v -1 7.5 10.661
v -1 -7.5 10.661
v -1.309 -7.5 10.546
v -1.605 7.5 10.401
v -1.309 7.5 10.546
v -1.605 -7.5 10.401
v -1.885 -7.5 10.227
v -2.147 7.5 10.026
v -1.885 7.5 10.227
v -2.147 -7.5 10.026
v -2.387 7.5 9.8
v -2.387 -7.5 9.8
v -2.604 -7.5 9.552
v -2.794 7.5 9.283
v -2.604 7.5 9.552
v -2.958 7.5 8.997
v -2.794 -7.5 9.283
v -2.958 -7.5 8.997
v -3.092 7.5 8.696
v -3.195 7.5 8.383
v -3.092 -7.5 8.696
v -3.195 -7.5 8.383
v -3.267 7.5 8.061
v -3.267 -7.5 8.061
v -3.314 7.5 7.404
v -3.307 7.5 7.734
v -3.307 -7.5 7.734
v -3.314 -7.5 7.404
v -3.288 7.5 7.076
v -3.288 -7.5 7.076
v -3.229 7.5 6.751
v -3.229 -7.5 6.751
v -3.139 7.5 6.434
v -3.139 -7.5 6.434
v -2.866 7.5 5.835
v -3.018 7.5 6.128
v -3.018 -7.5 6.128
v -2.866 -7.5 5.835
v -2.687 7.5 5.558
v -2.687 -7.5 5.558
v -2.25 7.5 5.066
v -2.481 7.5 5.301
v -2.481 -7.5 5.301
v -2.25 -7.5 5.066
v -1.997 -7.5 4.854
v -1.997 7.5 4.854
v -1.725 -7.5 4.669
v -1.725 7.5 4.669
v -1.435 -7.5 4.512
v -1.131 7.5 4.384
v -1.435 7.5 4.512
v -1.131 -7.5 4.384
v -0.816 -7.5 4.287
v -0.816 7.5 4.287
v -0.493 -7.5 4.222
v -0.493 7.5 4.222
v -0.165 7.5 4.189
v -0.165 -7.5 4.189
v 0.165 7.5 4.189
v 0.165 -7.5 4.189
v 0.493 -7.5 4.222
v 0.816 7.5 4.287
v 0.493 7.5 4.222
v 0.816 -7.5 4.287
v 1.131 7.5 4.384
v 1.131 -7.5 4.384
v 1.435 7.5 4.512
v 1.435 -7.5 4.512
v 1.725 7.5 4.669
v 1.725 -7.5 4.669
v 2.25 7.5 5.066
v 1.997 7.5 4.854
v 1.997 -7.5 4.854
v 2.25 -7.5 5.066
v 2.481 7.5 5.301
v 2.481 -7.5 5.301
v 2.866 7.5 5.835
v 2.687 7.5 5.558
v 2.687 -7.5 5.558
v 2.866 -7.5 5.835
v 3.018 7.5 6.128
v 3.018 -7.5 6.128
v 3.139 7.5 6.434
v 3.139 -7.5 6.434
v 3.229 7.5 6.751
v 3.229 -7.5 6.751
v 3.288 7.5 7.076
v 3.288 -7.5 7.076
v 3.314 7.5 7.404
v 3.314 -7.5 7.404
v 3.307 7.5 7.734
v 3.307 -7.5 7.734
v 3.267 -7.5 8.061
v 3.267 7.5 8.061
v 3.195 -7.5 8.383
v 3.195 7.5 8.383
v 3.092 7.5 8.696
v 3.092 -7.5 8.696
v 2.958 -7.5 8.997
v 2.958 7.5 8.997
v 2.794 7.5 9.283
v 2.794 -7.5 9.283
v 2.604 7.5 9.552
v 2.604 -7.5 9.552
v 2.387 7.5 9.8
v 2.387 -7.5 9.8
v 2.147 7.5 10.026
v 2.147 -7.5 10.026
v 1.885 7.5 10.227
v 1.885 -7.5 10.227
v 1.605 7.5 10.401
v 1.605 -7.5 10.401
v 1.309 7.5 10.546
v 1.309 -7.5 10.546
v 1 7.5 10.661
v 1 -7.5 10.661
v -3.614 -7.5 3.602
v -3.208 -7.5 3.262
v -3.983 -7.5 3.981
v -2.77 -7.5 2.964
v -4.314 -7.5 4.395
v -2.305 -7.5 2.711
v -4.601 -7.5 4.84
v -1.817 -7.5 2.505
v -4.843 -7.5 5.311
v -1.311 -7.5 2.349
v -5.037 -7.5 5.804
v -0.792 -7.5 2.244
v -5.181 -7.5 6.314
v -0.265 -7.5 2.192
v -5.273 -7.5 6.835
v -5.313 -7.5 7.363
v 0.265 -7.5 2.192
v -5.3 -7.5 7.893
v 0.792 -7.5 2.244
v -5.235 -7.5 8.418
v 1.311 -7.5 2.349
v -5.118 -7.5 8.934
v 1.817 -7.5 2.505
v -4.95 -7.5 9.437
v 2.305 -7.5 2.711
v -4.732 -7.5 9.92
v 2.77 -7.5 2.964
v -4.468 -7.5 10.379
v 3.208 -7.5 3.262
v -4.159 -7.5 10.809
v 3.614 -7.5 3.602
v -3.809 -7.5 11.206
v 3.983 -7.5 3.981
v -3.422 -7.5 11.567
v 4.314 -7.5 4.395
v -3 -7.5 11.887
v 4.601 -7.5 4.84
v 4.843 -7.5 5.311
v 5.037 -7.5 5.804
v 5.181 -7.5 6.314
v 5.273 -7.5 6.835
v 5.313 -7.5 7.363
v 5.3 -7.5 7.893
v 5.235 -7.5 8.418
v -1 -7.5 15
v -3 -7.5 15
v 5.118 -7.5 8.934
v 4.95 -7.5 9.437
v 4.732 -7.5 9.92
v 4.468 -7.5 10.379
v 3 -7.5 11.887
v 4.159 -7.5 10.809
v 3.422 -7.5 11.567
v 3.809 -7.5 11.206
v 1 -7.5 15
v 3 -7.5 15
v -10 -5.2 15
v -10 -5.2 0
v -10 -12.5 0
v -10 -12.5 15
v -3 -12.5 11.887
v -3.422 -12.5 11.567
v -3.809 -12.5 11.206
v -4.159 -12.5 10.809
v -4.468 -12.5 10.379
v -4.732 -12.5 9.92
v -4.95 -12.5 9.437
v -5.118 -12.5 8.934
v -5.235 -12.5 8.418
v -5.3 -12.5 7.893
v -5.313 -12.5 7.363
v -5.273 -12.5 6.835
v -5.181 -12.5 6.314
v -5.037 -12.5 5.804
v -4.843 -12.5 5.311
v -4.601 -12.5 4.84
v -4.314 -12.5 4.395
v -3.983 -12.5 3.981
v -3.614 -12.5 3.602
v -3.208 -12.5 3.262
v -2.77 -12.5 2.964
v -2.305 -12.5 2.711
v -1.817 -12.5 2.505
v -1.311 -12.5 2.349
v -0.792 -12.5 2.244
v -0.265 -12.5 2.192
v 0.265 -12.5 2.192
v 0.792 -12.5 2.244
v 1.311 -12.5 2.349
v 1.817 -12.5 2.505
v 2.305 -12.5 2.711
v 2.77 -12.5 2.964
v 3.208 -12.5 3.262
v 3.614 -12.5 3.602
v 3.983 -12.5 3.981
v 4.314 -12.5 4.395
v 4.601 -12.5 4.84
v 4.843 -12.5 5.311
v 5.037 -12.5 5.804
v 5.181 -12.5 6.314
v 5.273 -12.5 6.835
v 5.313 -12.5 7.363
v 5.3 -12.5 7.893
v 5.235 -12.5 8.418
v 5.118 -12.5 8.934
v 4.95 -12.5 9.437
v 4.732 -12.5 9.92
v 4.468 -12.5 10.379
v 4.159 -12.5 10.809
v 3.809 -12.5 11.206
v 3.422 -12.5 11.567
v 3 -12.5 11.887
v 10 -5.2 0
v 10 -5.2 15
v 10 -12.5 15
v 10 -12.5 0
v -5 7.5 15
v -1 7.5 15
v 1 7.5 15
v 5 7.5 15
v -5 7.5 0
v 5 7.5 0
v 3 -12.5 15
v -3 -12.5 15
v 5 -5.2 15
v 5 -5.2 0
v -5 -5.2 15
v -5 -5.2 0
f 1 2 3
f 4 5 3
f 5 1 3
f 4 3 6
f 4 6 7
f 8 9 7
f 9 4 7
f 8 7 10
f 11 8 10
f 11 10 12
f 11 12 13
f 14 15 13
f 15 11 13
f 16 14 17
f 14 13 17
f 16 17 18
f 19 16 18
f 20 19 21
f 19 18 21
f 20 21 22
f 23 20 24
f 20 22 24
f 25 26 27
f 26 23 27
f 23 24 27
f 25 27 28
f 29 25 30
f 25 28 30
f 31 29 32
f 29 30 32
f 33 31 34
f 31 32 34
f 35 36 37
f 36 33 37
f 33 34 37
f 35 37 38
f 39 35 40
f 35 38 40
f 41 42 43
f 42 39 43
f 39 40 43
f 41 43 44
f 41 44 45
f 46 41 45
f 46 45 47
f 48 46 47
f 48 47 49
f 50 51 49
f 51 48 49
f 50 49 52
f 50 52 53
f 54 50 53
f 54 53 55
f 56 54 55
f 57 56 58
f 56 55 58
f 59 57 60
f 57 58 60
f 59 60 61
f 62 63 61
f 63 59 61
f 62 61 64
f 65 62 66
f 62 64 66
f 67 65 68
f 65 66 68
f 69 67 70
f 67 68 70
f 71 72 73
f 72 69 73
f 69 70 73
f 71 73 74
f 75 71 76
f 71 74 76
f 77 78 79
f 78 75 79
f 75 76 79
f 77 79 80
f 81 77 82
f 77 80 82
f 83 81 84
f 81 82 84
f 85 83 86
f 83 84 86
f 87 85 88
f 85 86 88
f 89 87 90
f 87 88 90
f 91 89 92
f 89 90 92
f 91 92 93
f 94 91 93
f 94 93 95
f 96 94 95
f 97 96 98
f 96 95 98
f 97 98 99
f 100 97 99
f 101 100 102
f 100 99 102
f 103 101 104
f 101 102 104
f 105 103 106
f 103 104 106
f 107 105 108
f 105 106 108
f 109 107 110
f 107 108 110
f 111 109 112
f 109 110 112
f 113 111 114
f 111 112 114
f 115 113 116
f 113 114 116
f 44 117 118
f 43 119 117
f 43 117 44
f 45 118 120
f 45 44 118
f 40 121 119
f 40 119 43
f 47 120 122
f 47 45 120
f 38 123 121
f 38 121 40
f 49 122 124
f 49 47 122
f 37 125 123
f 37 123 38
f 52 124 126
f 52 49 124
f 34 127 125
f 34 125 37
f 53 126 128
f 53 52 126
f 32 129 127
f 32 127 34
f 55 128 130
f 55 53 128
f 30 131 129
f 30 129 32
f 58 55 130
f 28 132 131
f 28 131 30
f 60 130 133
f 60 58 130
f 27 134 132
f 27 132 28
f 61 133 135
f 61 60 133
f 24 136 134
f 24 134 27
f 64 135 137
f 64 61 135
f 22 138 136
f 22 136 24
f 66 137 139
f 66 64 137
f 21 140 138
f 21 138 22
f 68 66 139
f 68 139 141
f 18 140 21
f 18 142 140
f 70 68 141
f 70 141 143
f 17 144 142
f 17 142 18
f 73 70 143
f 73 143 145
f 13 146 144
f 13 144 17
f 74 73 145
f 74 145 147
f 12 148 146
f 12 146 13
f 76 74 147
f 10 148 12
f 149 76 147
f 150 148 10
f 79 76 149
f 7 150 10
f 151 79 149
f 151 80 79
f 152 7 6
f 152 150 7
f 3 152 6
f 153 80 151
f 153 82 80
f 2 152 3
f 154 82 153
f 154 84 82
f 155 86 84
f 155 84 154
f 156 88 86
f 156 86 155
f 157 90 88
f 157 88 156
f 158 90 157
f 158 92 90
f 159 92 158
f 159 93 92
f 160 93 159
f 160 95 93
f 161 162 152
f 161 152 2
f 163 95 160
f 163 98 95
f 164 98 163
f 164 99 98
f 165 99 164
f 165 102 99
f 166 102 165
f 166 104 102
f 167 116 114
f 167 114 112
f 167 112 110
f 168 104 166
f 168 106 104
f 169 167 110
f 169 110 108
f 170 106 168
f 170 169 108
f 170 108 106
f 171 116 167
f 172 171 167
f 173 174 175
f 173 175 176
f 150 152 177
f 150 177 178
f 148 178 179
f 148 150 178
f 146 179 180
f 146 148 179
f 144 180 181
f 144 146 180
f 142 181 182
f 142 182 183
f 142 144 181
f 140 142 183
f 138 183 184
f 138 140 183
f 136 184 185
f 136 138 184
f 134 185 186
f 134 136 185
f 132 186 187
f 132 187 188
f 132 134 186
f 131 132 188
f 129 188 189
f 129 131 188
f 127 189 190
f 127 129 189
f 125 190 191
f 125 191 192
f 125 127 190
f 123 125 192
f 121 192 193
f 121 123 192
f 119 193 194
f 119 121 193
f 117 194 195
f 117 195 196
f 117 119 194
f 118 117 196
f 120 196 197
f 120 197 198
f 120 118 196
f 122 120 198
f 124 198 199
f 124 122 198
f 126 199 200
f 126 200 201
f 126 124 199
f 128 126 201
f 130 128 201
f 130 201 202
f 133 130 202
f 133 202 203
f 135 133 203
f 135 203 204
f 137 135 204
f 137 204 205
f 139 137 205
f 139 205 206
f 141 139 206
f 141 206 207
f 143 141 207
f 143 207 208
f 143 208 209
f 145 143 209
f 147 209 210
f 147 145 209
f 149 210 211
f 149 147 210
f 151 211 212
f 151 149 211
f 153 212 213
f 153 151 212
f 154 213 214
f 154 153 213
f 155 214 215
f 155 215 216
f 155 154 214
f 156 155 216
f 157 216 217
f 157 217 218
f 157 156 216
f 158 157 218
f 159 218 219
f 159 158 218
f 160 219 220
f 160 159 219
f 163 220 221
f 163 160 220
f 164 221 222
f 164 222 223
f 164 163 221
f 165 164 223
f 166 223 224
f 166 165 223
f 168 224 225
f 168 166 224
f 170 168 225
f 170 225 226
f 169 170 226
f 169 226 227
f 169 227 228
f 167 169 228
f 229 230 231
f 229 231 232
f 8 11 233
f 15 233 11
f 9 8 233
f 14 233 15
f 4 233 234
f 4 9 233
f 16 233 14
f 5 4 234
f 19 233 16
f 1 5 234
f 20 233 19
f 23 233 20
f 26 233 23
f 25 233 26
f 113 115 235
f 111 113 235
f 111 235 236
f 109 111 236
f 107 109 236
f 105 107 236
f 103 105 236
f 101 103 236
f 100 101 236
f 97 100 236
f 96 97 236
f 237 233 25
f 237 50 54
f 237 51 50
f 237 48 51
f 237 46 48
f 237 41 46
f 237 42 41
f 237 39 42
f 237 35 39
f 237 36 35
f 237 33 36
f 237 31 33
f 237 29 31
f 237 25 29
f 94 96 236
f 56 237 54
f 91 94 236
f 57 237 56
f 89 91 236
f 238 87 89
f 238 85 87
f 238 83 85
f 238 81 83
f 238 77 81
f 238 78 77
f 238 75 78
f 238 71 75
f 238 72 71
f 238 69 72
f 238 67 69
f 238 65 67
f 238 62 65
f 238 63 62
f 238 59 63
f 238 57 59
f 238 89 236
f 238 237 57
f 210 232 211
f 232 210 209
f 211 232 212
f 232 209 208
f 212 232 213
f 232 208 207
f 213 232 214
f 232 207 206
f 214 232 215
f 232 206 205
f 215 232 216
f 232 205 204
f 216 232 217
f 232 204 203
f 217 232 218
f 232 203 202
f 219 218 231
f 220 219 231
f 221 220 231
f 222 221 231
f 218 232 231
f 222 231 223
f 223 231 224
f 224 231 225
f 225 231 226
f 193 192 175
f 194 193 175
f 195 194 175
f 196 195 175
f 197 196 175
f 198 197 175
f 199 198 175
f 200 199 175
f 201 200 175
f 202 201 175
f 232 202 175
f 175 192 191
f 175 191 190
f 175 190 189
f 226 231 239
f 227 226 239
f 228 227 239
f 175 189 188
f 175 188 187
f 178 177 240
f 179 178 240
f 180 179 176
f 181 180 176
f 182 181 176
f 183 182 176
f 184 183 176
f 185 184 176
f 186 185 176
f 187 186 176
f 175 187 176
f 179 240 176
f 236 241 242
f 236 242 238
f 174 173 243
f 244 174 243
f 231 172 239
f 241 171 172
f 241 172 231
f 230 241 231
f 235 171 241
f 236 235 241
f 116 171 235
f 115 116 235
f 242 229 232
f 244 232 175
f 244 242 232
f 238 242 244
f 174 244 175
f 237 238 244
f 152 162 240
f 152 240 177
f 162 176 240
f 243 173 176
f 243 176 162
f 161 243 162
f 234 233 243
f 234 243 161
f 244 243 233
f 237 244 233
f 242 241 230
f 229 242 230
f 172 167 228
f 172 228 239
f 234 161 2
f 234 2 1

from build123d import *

# Parameters (mm, degrees)
SKETCH1_W           = 10
SKETCH1_H           = 15
BOSS_EXTRUDE1_DEPTH = 15
SKETCH3_W           = 5
SKETCH3_H           = 2.3
BOSS_EXTRUDE2_DEPTH = 15
SKETCH4_R           = 3.315
CUT_EXTRUDE1_DEPTH  = 24.452078799
SKETCH6_W           = 2
SKETCH6_H           = 15
CUT_EXTRUDE2_DEPTH  = 8
BOSS_EXTRUDE3_DEPTH = 5


with BuildPart() as part:
    # Sketch1 → Boss-Extrude1 (new body)
    with BuildSketch(Plane.XY):
        Rectangle(SKETCH1_W, SKETCH1_H)
    extrude(amount=BOSS_EXTRUDE1_DEPTH)

    # Sketch3 → Boss-Extrude2 (add)
    with BuildSketch(Plane.XY.offset(15)):
        with Locations((-7.5, -6.35)):
            Rectangle(SKETCH3_W, SKETCH3_H)
        with Locations((7.5, -6.35)):
            Rectangle(SKETCH3_W, SKETCH3_H)
    extrude(amount=-BOSS_EXTRUDE2_DEPTH)

    # Sketch4 → Cut-Extrude1 (cut, through all)
    with BuildSketch(Plane.XZ.offset(7.5)):
        with Locations(Location((0, 7.5, 0), (0, 0, 270))):
            Circle(SKETCH4_R)
    extrude(amount=-CUT_EXTRUDE1_DEPTH, mode=Mode.SUBTRACT)

    # Sketch6 → Cut-Extrude2 (cut)
    with BuildSketch(Plane.XY.offset(15)):
        Rectangle(SKETCH6_W, SKETCH6_H)
    extrude(amount=-CUT_EXTRUDE2_DEPTH, mode=Mode.SUBTRACT)

    # Sketch7 → Boss-Extrude3 (add)
    with BuildSketch(Plane.XZ.offset(7.5)):
        with BuildLine():
            Line((3, 15), (10, 15))
            Line((10, 15), (10, 0))
            Line((10, 0), (-10, 0))
            Line((-10, 0), (-10, 15))
            Line((-10, 15), (-3, 15))
            Line((-3, 15), (-3, 11.887393873))
            ThreePointArc((-3, 11.887393873), (0, 2.185), (3, 11.887393873))
            Line((3, 11.887393873), (3, 15))
        make_face()
    extrude(amount=BOSS_EXTRUDE3_DEPTH)


solid = part.part
